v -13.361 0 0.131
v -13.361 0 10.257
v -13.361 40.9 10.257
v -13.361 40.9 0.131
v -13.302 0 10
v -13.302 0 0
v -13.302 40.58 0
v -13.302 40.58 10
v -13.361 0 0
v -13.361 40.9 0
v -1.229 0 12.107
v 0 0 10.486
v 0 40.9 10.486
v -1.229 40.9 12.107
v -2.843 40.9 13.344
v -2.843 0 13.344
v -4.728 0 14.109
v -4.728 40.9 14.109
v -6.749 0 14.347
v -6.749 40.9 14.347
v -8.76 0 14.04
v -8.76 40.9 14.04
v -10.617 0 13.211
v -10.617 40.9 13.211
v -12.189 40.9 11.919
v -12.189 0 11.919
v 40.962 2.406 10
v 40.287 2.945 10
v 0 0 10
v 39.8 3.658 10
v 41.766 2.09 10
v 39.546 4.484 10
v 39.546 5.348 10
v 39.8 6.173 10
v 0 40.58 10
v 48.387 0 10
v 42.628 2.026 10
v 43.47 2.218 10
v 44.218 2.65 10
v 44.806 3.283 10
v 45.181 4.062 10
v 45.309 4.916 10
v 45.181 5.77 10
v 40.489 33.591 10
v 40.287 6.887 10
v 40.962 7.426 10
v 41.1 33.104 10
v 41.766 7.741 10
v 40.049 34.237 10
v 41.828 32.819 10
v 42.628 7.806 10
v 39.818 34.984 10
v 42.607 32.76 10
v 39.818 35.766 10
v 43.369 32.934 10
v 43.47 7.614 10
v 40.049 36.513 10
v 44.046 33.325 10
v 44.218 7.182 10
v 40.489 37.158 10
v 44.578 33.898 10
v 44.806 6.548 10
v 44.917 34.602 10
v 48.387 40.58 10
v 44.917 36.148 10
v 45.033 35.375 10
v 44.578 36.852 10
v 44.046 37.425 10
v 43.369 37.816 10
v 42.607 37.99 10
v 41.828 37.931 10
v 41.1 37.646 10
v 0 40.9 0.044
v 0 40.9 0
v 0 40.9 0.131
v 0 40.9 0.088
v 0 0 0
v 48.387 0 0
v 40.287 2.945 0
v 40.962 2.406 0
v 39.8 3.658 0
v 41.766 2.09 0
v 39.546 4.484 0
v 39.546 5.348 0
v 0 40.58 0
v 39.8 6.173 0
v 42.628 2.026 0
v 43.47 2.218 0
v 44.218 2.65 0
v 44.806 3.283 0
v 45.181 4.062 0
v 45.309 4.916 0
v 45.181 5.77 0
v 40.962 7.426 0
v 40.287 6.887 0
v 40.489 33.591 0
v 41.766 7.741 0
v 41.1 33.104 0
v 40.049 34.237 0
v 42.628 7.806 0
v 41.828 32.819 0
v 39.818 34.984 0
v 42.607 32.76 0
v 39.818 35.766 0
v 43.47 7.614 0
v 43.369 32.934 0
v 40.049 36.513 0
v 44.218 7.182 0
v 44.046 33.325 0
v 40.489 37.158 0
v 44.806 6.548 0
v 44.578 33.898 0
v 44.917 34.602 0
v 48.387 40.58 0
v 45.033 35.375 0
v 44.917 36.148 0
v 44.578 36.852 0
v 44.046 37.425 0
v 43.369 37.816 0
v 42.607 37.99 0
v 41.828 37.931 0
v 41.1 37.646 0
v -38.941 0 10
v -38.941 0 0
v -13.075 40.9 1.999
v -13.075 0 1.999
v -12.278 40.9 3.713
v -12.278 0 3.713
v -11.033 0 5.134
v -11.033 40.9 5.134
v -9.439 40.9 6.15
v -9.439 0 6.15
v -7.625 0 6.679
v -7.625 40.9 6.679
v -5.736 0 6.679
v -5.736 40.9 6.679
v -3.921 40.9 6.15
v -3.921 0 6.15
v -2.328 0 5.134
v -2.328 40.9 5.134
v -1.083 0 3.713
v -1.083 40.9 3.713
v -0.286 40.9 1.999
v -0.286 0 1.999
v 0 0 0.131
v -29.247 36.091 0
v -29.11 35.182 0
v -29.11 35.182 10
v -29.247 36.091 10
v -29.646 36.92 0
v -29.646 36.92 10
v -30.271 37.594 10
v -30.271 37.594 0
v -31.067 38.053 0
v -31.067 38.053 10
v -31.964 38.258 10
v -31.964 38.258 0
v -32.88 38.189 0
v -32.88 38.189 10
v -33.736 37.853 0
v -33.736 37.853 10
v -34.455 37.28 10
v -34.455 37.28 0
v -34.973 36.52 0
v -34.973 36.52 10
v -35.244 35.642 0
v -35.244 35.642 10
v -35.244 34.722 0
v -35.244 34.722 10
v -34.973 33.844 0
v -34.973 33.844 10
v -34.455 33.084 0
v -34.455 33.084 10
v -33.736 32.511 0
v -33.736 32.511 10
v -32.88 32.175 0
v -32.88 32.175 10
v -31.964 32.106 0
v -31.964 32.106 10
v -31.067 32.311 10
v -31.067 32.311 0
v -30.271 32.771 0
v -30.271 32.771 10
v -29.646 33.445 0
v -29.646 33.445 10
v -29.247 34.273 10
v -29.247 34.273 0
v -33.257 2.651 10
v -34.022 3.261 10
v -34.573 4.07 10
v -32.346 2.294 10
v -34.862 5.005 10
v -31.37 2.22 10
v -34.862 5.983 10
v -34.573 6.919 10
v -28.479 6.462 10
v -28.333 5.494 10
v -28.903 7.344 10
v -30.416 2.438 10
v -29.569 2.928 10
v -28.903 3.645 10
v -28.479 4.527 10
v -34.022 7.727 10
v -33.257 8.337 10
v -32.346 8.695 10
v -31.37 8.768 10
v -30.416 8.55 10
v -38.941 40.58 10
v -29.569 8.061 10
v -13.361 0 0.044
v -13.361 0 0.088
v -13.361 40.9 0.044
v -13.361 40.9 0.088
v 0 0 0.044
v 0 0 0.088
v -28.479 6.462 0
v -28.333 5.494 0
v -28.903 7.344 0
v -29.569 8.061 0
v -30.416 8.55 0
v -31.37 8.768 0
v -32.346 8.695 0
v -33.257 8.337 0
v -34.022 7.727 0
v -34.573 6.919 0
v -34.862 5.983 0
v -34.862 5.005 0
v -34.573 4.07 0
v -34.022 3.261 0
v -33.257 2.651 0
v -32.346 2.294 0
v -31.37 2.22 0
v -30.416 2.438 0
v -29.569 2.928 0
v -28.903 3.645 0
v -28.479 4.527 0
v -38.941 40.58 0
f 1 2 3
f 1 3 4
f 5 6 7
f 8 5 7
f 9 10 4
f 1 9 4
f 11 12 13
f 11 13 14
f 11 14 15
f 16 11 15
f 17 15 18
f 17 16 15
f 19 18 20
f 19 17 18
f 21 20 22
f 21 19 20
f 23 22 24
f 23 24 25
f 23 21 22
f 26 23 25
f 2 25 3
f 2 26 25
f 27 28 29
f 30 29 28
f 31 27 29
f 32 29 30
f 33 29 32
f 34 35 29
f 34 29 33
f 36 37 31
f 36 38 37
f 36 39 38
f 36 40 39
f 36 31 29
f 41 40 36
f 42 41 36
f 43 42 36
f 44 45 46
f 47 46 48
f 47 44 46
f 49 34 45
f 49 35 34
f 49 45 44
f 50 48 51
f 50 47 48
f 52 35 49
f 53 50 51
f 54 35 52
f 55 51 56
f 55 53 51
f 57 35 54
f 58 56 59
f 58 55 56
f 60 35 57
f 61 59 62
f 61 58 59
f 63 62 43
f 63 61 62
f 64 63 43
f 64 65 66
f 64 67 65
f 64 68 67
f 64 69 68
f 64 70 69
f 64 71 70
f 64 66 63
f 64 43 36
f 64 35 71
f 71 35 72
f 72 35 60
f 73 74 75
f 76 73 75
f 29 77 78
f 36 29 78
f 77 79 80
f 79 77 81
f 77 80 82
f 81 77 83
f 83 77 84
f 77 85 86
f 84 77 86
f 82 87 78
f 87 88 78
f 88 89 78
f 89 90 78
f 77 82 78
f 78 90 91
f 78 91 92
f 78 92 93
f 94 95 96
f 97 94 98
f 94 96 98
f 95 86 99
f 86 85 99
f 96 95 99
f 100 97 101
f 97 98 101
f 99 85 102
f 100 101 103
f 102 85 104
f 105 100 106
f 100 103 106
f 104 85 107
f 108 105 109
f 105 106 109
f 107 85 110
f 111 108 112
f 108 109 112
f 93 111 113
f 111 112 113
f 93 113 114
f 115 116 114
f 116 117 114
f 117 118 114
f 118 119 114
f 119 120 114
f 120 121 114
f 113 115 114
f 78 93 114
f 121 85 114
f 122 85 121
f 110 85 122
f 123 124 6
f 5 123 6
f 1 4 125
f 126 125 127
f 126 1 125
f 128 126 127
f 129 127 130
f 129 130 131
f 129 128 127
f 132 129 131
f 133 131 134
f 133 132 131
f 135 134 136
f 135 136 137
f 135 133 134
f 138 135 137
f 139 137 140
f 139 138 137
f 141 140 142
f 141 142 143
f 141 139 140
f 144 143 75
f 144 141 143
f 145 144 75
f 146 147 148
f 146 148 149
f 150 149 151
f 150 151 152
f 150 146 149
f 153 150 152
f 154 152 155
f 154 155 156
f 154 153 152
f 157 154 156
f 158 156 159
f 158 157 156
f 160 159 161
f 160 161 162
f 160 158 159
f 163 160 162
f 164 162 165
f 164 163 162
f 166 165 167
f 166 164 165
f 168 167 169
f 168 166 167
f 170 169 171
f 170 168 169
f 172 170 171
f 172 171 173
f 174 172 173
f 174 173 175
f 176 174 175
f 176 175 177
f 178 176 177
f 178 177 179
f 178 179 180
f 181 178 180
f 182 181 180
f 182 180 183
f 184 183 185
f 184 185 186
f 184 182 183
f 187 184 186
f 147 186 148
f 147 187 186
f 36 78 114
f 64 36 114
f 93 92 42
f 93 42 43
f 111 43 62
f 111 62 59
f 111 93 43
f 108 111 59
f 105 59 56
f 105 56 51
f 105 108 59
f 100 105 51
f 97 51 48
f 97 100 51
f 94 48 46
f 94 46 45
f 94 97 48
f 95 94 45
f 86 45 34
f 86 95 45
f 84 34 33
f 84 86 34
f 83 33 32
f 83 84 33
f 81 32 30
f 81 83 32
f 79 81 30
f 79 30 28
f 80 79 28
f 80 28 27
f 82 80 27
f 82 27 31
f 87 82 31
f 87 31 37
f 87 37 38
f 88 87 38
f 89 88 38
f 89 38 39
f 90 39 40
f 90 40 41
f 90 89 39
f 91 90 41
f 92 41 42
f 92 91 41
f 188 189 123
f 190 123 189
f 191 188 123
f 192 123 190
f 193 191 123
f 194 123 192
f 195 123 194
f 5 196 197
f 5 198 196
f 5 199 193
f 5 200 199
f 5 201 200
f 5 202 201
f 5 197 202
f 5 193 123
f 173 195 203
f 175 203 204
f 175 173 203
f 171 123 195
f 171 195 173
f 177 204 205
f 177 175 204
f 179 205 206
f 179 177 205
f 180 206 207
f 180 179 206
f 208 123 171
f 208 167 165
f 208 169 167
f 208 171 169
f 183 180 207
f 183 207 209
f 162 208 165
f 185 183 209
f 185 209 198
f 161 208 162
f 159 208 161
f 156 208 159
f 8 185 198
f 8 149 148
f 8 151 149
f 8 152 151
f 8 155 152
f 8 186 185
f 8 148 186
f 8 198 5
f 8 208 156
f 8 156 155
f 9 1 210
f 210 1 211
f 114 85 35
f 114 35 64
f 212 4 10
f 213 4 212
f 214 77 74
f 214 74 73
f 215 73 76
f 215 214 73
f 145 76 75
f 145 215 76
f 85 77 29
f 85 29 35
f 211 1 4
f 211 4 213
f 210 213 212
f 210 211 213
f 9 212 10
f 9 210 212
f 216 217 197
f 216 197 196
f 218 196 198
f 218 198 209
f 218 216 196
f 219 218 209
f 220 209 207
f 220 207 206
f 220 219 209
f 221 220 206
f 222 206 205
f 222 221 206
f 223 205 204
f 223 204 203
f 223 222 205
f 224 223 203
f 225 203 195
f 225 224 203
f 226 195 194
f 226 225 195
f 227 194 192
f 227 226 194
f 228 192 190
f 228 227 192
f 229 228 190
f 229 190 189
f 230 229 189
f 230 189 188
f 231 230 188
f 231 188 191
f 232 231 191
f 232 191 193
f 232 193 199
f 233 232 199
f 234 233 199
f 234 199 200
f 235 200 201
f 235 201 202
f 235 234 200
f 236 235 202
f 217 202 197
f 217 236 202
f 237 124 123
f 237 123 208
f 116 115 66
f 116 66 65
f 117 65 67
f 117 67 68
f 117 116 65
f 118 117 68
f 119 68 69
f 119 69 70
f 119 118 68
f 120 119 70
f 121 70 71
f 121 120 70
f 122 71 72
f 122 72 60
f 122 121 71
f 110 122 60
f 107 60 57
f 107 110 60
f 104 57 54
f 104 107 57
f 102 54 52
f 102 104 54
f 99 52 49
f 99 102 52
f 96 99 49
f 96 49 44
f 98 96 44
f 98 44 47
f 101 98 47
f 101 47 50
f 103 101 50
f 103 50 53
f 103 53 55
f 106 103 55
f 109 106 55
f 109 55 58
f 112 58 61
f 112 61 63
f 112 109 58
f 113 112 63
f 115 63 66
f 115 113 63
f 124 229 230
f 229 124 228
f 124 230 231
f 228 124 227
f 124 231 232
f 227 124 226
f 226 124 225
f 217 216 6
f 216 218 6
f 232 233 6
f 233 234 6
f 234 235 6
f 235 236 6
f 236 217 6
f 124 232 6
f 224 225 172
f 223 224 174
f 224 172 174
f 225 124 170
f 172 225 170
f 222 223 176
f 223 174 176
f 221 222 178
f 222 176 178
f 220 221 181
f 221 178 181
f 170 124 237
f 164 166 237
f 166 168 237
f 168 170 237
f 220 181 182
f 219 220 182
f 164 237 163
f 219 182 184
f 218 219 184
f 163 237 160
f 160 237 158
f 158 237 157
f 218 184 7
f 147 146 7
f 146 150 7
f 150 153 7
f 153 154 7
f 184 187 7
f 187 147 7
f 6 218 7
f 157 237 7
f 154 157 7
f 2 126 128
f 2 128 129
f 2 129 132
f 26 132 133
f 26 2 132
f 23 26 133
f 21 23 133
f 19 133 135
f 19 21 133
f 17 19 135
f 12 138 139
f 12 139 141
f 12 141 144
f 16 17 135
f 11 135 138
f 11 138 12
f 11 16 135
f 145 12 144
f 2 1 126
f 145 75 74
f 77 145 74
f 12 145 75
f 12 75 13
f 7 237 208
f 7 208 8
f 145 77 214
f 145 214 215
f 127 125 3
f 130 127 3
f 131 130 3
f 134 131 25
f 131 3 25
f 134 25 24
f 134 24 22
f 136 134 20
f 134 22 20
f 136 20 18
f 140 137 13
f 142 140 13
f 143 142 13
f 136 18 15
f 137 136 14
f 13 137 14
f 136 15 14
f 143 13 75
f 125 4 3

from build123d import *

# Parameters (mm, degrees)
F0_W     = 25.6395349279
F0_H     = 40.5798666179
F0_R     = 3.2828979143
F0_R_2   = 3.0844546854
F1_DEPTH = 10
F0_W_2   = 48.3873933554
F0_R_3   = 2.8980934491
F0_R_4   = 2.6220674829
F3_DEPTH = 40.9


with BuildPart() as f1:
    # F0 (on Top) → F1 (new body)
    with BuildSketch(Plane.XY):
        with Locations((-26.1214817874, 20.289933309)):
            Rectangle(F0_W, F0_H)
        with Locations((-31.6156670451, 5.4941866547)):
            Circle(F0_R, mode=Mode.SUBTRACT)
        with Locations((-32.1940034628, 35.1820699871)):
            Circle(F0_R_2, mode=Mode.SUBTRACT)
    extrude(amount=F1_DEPTH)


with BuildPart() as f1b:
    # F0 (on Top) → F1, piece 2 (new body)
    with BuildSketch(Plane.XY):
        with Locations((24.1936966777, 20.289933309)):
            Rectangle(F0_W_2, F0_H)
        with Locations((42.4112640321, 4.9158507027)):
            Circle(F0_R_3, mode=Mode.SUBTRACT)
        with Locations((42.4112640321, 35.3748500347)):
            Circle(F0_R_4, mode=Mode.SUBTRACT)
    extrude(amount=F1_DEPTH)


with BuildPart() as f3:
    # F2 (on Front) → F3 (new body)
    with BuildSketch(Plane.XZ):
        with BuildLine():
            Line((0, 0.1313262168), (0, 10.4859210551))
            ThreePointArc((0, 10.4859210551), (-6.7486562288, 14.3467999869), (-13.3608840406, 10.2566666901))
            Line((-13.3608840406, 10.2566666901), (-13.3608840406, 0.1313262168))
            ThreePointArc((-13.3608840406, 0.1313262168), (-6.6804420203, 6.7464278274), (0, 0.1313262168))
        make_face()
    extrude(amount=-F3_DEPTH)


with BuildPart() as f3b:
    # F2 (on Front) → F3, piece 2 (new body)
    with BuildSketch(Plane.XZ):
        with BuildLine():
            ThreePointArc((0, 0), (0.0003226987, 0.0656631084), (0, 0.1313262168))
            Line((0, 0.1313262168), (0, 0))
        make_face()
    extrude(amount=-F3_DEPTH)


with BuildPart() as f3c:
    # F2 (on Front) → F3, piece 3 (new body)
    with BuildSketch(Plane.XZ):
        with BuildLine():
            Line((-13.3608840406, 0), (-13.3608840406, 0.1313262168))
            ThreePointArc((-13.3608840406, 0.1313262168), (-13.3612067393, 0.0656631084), (-13.3608840406, 0))
        make_face()
    extrude(amount=-F3_DEPTH)


solid = Compound([f1.part, f1b.part, f3.part, f3b.part, f3c.part])
